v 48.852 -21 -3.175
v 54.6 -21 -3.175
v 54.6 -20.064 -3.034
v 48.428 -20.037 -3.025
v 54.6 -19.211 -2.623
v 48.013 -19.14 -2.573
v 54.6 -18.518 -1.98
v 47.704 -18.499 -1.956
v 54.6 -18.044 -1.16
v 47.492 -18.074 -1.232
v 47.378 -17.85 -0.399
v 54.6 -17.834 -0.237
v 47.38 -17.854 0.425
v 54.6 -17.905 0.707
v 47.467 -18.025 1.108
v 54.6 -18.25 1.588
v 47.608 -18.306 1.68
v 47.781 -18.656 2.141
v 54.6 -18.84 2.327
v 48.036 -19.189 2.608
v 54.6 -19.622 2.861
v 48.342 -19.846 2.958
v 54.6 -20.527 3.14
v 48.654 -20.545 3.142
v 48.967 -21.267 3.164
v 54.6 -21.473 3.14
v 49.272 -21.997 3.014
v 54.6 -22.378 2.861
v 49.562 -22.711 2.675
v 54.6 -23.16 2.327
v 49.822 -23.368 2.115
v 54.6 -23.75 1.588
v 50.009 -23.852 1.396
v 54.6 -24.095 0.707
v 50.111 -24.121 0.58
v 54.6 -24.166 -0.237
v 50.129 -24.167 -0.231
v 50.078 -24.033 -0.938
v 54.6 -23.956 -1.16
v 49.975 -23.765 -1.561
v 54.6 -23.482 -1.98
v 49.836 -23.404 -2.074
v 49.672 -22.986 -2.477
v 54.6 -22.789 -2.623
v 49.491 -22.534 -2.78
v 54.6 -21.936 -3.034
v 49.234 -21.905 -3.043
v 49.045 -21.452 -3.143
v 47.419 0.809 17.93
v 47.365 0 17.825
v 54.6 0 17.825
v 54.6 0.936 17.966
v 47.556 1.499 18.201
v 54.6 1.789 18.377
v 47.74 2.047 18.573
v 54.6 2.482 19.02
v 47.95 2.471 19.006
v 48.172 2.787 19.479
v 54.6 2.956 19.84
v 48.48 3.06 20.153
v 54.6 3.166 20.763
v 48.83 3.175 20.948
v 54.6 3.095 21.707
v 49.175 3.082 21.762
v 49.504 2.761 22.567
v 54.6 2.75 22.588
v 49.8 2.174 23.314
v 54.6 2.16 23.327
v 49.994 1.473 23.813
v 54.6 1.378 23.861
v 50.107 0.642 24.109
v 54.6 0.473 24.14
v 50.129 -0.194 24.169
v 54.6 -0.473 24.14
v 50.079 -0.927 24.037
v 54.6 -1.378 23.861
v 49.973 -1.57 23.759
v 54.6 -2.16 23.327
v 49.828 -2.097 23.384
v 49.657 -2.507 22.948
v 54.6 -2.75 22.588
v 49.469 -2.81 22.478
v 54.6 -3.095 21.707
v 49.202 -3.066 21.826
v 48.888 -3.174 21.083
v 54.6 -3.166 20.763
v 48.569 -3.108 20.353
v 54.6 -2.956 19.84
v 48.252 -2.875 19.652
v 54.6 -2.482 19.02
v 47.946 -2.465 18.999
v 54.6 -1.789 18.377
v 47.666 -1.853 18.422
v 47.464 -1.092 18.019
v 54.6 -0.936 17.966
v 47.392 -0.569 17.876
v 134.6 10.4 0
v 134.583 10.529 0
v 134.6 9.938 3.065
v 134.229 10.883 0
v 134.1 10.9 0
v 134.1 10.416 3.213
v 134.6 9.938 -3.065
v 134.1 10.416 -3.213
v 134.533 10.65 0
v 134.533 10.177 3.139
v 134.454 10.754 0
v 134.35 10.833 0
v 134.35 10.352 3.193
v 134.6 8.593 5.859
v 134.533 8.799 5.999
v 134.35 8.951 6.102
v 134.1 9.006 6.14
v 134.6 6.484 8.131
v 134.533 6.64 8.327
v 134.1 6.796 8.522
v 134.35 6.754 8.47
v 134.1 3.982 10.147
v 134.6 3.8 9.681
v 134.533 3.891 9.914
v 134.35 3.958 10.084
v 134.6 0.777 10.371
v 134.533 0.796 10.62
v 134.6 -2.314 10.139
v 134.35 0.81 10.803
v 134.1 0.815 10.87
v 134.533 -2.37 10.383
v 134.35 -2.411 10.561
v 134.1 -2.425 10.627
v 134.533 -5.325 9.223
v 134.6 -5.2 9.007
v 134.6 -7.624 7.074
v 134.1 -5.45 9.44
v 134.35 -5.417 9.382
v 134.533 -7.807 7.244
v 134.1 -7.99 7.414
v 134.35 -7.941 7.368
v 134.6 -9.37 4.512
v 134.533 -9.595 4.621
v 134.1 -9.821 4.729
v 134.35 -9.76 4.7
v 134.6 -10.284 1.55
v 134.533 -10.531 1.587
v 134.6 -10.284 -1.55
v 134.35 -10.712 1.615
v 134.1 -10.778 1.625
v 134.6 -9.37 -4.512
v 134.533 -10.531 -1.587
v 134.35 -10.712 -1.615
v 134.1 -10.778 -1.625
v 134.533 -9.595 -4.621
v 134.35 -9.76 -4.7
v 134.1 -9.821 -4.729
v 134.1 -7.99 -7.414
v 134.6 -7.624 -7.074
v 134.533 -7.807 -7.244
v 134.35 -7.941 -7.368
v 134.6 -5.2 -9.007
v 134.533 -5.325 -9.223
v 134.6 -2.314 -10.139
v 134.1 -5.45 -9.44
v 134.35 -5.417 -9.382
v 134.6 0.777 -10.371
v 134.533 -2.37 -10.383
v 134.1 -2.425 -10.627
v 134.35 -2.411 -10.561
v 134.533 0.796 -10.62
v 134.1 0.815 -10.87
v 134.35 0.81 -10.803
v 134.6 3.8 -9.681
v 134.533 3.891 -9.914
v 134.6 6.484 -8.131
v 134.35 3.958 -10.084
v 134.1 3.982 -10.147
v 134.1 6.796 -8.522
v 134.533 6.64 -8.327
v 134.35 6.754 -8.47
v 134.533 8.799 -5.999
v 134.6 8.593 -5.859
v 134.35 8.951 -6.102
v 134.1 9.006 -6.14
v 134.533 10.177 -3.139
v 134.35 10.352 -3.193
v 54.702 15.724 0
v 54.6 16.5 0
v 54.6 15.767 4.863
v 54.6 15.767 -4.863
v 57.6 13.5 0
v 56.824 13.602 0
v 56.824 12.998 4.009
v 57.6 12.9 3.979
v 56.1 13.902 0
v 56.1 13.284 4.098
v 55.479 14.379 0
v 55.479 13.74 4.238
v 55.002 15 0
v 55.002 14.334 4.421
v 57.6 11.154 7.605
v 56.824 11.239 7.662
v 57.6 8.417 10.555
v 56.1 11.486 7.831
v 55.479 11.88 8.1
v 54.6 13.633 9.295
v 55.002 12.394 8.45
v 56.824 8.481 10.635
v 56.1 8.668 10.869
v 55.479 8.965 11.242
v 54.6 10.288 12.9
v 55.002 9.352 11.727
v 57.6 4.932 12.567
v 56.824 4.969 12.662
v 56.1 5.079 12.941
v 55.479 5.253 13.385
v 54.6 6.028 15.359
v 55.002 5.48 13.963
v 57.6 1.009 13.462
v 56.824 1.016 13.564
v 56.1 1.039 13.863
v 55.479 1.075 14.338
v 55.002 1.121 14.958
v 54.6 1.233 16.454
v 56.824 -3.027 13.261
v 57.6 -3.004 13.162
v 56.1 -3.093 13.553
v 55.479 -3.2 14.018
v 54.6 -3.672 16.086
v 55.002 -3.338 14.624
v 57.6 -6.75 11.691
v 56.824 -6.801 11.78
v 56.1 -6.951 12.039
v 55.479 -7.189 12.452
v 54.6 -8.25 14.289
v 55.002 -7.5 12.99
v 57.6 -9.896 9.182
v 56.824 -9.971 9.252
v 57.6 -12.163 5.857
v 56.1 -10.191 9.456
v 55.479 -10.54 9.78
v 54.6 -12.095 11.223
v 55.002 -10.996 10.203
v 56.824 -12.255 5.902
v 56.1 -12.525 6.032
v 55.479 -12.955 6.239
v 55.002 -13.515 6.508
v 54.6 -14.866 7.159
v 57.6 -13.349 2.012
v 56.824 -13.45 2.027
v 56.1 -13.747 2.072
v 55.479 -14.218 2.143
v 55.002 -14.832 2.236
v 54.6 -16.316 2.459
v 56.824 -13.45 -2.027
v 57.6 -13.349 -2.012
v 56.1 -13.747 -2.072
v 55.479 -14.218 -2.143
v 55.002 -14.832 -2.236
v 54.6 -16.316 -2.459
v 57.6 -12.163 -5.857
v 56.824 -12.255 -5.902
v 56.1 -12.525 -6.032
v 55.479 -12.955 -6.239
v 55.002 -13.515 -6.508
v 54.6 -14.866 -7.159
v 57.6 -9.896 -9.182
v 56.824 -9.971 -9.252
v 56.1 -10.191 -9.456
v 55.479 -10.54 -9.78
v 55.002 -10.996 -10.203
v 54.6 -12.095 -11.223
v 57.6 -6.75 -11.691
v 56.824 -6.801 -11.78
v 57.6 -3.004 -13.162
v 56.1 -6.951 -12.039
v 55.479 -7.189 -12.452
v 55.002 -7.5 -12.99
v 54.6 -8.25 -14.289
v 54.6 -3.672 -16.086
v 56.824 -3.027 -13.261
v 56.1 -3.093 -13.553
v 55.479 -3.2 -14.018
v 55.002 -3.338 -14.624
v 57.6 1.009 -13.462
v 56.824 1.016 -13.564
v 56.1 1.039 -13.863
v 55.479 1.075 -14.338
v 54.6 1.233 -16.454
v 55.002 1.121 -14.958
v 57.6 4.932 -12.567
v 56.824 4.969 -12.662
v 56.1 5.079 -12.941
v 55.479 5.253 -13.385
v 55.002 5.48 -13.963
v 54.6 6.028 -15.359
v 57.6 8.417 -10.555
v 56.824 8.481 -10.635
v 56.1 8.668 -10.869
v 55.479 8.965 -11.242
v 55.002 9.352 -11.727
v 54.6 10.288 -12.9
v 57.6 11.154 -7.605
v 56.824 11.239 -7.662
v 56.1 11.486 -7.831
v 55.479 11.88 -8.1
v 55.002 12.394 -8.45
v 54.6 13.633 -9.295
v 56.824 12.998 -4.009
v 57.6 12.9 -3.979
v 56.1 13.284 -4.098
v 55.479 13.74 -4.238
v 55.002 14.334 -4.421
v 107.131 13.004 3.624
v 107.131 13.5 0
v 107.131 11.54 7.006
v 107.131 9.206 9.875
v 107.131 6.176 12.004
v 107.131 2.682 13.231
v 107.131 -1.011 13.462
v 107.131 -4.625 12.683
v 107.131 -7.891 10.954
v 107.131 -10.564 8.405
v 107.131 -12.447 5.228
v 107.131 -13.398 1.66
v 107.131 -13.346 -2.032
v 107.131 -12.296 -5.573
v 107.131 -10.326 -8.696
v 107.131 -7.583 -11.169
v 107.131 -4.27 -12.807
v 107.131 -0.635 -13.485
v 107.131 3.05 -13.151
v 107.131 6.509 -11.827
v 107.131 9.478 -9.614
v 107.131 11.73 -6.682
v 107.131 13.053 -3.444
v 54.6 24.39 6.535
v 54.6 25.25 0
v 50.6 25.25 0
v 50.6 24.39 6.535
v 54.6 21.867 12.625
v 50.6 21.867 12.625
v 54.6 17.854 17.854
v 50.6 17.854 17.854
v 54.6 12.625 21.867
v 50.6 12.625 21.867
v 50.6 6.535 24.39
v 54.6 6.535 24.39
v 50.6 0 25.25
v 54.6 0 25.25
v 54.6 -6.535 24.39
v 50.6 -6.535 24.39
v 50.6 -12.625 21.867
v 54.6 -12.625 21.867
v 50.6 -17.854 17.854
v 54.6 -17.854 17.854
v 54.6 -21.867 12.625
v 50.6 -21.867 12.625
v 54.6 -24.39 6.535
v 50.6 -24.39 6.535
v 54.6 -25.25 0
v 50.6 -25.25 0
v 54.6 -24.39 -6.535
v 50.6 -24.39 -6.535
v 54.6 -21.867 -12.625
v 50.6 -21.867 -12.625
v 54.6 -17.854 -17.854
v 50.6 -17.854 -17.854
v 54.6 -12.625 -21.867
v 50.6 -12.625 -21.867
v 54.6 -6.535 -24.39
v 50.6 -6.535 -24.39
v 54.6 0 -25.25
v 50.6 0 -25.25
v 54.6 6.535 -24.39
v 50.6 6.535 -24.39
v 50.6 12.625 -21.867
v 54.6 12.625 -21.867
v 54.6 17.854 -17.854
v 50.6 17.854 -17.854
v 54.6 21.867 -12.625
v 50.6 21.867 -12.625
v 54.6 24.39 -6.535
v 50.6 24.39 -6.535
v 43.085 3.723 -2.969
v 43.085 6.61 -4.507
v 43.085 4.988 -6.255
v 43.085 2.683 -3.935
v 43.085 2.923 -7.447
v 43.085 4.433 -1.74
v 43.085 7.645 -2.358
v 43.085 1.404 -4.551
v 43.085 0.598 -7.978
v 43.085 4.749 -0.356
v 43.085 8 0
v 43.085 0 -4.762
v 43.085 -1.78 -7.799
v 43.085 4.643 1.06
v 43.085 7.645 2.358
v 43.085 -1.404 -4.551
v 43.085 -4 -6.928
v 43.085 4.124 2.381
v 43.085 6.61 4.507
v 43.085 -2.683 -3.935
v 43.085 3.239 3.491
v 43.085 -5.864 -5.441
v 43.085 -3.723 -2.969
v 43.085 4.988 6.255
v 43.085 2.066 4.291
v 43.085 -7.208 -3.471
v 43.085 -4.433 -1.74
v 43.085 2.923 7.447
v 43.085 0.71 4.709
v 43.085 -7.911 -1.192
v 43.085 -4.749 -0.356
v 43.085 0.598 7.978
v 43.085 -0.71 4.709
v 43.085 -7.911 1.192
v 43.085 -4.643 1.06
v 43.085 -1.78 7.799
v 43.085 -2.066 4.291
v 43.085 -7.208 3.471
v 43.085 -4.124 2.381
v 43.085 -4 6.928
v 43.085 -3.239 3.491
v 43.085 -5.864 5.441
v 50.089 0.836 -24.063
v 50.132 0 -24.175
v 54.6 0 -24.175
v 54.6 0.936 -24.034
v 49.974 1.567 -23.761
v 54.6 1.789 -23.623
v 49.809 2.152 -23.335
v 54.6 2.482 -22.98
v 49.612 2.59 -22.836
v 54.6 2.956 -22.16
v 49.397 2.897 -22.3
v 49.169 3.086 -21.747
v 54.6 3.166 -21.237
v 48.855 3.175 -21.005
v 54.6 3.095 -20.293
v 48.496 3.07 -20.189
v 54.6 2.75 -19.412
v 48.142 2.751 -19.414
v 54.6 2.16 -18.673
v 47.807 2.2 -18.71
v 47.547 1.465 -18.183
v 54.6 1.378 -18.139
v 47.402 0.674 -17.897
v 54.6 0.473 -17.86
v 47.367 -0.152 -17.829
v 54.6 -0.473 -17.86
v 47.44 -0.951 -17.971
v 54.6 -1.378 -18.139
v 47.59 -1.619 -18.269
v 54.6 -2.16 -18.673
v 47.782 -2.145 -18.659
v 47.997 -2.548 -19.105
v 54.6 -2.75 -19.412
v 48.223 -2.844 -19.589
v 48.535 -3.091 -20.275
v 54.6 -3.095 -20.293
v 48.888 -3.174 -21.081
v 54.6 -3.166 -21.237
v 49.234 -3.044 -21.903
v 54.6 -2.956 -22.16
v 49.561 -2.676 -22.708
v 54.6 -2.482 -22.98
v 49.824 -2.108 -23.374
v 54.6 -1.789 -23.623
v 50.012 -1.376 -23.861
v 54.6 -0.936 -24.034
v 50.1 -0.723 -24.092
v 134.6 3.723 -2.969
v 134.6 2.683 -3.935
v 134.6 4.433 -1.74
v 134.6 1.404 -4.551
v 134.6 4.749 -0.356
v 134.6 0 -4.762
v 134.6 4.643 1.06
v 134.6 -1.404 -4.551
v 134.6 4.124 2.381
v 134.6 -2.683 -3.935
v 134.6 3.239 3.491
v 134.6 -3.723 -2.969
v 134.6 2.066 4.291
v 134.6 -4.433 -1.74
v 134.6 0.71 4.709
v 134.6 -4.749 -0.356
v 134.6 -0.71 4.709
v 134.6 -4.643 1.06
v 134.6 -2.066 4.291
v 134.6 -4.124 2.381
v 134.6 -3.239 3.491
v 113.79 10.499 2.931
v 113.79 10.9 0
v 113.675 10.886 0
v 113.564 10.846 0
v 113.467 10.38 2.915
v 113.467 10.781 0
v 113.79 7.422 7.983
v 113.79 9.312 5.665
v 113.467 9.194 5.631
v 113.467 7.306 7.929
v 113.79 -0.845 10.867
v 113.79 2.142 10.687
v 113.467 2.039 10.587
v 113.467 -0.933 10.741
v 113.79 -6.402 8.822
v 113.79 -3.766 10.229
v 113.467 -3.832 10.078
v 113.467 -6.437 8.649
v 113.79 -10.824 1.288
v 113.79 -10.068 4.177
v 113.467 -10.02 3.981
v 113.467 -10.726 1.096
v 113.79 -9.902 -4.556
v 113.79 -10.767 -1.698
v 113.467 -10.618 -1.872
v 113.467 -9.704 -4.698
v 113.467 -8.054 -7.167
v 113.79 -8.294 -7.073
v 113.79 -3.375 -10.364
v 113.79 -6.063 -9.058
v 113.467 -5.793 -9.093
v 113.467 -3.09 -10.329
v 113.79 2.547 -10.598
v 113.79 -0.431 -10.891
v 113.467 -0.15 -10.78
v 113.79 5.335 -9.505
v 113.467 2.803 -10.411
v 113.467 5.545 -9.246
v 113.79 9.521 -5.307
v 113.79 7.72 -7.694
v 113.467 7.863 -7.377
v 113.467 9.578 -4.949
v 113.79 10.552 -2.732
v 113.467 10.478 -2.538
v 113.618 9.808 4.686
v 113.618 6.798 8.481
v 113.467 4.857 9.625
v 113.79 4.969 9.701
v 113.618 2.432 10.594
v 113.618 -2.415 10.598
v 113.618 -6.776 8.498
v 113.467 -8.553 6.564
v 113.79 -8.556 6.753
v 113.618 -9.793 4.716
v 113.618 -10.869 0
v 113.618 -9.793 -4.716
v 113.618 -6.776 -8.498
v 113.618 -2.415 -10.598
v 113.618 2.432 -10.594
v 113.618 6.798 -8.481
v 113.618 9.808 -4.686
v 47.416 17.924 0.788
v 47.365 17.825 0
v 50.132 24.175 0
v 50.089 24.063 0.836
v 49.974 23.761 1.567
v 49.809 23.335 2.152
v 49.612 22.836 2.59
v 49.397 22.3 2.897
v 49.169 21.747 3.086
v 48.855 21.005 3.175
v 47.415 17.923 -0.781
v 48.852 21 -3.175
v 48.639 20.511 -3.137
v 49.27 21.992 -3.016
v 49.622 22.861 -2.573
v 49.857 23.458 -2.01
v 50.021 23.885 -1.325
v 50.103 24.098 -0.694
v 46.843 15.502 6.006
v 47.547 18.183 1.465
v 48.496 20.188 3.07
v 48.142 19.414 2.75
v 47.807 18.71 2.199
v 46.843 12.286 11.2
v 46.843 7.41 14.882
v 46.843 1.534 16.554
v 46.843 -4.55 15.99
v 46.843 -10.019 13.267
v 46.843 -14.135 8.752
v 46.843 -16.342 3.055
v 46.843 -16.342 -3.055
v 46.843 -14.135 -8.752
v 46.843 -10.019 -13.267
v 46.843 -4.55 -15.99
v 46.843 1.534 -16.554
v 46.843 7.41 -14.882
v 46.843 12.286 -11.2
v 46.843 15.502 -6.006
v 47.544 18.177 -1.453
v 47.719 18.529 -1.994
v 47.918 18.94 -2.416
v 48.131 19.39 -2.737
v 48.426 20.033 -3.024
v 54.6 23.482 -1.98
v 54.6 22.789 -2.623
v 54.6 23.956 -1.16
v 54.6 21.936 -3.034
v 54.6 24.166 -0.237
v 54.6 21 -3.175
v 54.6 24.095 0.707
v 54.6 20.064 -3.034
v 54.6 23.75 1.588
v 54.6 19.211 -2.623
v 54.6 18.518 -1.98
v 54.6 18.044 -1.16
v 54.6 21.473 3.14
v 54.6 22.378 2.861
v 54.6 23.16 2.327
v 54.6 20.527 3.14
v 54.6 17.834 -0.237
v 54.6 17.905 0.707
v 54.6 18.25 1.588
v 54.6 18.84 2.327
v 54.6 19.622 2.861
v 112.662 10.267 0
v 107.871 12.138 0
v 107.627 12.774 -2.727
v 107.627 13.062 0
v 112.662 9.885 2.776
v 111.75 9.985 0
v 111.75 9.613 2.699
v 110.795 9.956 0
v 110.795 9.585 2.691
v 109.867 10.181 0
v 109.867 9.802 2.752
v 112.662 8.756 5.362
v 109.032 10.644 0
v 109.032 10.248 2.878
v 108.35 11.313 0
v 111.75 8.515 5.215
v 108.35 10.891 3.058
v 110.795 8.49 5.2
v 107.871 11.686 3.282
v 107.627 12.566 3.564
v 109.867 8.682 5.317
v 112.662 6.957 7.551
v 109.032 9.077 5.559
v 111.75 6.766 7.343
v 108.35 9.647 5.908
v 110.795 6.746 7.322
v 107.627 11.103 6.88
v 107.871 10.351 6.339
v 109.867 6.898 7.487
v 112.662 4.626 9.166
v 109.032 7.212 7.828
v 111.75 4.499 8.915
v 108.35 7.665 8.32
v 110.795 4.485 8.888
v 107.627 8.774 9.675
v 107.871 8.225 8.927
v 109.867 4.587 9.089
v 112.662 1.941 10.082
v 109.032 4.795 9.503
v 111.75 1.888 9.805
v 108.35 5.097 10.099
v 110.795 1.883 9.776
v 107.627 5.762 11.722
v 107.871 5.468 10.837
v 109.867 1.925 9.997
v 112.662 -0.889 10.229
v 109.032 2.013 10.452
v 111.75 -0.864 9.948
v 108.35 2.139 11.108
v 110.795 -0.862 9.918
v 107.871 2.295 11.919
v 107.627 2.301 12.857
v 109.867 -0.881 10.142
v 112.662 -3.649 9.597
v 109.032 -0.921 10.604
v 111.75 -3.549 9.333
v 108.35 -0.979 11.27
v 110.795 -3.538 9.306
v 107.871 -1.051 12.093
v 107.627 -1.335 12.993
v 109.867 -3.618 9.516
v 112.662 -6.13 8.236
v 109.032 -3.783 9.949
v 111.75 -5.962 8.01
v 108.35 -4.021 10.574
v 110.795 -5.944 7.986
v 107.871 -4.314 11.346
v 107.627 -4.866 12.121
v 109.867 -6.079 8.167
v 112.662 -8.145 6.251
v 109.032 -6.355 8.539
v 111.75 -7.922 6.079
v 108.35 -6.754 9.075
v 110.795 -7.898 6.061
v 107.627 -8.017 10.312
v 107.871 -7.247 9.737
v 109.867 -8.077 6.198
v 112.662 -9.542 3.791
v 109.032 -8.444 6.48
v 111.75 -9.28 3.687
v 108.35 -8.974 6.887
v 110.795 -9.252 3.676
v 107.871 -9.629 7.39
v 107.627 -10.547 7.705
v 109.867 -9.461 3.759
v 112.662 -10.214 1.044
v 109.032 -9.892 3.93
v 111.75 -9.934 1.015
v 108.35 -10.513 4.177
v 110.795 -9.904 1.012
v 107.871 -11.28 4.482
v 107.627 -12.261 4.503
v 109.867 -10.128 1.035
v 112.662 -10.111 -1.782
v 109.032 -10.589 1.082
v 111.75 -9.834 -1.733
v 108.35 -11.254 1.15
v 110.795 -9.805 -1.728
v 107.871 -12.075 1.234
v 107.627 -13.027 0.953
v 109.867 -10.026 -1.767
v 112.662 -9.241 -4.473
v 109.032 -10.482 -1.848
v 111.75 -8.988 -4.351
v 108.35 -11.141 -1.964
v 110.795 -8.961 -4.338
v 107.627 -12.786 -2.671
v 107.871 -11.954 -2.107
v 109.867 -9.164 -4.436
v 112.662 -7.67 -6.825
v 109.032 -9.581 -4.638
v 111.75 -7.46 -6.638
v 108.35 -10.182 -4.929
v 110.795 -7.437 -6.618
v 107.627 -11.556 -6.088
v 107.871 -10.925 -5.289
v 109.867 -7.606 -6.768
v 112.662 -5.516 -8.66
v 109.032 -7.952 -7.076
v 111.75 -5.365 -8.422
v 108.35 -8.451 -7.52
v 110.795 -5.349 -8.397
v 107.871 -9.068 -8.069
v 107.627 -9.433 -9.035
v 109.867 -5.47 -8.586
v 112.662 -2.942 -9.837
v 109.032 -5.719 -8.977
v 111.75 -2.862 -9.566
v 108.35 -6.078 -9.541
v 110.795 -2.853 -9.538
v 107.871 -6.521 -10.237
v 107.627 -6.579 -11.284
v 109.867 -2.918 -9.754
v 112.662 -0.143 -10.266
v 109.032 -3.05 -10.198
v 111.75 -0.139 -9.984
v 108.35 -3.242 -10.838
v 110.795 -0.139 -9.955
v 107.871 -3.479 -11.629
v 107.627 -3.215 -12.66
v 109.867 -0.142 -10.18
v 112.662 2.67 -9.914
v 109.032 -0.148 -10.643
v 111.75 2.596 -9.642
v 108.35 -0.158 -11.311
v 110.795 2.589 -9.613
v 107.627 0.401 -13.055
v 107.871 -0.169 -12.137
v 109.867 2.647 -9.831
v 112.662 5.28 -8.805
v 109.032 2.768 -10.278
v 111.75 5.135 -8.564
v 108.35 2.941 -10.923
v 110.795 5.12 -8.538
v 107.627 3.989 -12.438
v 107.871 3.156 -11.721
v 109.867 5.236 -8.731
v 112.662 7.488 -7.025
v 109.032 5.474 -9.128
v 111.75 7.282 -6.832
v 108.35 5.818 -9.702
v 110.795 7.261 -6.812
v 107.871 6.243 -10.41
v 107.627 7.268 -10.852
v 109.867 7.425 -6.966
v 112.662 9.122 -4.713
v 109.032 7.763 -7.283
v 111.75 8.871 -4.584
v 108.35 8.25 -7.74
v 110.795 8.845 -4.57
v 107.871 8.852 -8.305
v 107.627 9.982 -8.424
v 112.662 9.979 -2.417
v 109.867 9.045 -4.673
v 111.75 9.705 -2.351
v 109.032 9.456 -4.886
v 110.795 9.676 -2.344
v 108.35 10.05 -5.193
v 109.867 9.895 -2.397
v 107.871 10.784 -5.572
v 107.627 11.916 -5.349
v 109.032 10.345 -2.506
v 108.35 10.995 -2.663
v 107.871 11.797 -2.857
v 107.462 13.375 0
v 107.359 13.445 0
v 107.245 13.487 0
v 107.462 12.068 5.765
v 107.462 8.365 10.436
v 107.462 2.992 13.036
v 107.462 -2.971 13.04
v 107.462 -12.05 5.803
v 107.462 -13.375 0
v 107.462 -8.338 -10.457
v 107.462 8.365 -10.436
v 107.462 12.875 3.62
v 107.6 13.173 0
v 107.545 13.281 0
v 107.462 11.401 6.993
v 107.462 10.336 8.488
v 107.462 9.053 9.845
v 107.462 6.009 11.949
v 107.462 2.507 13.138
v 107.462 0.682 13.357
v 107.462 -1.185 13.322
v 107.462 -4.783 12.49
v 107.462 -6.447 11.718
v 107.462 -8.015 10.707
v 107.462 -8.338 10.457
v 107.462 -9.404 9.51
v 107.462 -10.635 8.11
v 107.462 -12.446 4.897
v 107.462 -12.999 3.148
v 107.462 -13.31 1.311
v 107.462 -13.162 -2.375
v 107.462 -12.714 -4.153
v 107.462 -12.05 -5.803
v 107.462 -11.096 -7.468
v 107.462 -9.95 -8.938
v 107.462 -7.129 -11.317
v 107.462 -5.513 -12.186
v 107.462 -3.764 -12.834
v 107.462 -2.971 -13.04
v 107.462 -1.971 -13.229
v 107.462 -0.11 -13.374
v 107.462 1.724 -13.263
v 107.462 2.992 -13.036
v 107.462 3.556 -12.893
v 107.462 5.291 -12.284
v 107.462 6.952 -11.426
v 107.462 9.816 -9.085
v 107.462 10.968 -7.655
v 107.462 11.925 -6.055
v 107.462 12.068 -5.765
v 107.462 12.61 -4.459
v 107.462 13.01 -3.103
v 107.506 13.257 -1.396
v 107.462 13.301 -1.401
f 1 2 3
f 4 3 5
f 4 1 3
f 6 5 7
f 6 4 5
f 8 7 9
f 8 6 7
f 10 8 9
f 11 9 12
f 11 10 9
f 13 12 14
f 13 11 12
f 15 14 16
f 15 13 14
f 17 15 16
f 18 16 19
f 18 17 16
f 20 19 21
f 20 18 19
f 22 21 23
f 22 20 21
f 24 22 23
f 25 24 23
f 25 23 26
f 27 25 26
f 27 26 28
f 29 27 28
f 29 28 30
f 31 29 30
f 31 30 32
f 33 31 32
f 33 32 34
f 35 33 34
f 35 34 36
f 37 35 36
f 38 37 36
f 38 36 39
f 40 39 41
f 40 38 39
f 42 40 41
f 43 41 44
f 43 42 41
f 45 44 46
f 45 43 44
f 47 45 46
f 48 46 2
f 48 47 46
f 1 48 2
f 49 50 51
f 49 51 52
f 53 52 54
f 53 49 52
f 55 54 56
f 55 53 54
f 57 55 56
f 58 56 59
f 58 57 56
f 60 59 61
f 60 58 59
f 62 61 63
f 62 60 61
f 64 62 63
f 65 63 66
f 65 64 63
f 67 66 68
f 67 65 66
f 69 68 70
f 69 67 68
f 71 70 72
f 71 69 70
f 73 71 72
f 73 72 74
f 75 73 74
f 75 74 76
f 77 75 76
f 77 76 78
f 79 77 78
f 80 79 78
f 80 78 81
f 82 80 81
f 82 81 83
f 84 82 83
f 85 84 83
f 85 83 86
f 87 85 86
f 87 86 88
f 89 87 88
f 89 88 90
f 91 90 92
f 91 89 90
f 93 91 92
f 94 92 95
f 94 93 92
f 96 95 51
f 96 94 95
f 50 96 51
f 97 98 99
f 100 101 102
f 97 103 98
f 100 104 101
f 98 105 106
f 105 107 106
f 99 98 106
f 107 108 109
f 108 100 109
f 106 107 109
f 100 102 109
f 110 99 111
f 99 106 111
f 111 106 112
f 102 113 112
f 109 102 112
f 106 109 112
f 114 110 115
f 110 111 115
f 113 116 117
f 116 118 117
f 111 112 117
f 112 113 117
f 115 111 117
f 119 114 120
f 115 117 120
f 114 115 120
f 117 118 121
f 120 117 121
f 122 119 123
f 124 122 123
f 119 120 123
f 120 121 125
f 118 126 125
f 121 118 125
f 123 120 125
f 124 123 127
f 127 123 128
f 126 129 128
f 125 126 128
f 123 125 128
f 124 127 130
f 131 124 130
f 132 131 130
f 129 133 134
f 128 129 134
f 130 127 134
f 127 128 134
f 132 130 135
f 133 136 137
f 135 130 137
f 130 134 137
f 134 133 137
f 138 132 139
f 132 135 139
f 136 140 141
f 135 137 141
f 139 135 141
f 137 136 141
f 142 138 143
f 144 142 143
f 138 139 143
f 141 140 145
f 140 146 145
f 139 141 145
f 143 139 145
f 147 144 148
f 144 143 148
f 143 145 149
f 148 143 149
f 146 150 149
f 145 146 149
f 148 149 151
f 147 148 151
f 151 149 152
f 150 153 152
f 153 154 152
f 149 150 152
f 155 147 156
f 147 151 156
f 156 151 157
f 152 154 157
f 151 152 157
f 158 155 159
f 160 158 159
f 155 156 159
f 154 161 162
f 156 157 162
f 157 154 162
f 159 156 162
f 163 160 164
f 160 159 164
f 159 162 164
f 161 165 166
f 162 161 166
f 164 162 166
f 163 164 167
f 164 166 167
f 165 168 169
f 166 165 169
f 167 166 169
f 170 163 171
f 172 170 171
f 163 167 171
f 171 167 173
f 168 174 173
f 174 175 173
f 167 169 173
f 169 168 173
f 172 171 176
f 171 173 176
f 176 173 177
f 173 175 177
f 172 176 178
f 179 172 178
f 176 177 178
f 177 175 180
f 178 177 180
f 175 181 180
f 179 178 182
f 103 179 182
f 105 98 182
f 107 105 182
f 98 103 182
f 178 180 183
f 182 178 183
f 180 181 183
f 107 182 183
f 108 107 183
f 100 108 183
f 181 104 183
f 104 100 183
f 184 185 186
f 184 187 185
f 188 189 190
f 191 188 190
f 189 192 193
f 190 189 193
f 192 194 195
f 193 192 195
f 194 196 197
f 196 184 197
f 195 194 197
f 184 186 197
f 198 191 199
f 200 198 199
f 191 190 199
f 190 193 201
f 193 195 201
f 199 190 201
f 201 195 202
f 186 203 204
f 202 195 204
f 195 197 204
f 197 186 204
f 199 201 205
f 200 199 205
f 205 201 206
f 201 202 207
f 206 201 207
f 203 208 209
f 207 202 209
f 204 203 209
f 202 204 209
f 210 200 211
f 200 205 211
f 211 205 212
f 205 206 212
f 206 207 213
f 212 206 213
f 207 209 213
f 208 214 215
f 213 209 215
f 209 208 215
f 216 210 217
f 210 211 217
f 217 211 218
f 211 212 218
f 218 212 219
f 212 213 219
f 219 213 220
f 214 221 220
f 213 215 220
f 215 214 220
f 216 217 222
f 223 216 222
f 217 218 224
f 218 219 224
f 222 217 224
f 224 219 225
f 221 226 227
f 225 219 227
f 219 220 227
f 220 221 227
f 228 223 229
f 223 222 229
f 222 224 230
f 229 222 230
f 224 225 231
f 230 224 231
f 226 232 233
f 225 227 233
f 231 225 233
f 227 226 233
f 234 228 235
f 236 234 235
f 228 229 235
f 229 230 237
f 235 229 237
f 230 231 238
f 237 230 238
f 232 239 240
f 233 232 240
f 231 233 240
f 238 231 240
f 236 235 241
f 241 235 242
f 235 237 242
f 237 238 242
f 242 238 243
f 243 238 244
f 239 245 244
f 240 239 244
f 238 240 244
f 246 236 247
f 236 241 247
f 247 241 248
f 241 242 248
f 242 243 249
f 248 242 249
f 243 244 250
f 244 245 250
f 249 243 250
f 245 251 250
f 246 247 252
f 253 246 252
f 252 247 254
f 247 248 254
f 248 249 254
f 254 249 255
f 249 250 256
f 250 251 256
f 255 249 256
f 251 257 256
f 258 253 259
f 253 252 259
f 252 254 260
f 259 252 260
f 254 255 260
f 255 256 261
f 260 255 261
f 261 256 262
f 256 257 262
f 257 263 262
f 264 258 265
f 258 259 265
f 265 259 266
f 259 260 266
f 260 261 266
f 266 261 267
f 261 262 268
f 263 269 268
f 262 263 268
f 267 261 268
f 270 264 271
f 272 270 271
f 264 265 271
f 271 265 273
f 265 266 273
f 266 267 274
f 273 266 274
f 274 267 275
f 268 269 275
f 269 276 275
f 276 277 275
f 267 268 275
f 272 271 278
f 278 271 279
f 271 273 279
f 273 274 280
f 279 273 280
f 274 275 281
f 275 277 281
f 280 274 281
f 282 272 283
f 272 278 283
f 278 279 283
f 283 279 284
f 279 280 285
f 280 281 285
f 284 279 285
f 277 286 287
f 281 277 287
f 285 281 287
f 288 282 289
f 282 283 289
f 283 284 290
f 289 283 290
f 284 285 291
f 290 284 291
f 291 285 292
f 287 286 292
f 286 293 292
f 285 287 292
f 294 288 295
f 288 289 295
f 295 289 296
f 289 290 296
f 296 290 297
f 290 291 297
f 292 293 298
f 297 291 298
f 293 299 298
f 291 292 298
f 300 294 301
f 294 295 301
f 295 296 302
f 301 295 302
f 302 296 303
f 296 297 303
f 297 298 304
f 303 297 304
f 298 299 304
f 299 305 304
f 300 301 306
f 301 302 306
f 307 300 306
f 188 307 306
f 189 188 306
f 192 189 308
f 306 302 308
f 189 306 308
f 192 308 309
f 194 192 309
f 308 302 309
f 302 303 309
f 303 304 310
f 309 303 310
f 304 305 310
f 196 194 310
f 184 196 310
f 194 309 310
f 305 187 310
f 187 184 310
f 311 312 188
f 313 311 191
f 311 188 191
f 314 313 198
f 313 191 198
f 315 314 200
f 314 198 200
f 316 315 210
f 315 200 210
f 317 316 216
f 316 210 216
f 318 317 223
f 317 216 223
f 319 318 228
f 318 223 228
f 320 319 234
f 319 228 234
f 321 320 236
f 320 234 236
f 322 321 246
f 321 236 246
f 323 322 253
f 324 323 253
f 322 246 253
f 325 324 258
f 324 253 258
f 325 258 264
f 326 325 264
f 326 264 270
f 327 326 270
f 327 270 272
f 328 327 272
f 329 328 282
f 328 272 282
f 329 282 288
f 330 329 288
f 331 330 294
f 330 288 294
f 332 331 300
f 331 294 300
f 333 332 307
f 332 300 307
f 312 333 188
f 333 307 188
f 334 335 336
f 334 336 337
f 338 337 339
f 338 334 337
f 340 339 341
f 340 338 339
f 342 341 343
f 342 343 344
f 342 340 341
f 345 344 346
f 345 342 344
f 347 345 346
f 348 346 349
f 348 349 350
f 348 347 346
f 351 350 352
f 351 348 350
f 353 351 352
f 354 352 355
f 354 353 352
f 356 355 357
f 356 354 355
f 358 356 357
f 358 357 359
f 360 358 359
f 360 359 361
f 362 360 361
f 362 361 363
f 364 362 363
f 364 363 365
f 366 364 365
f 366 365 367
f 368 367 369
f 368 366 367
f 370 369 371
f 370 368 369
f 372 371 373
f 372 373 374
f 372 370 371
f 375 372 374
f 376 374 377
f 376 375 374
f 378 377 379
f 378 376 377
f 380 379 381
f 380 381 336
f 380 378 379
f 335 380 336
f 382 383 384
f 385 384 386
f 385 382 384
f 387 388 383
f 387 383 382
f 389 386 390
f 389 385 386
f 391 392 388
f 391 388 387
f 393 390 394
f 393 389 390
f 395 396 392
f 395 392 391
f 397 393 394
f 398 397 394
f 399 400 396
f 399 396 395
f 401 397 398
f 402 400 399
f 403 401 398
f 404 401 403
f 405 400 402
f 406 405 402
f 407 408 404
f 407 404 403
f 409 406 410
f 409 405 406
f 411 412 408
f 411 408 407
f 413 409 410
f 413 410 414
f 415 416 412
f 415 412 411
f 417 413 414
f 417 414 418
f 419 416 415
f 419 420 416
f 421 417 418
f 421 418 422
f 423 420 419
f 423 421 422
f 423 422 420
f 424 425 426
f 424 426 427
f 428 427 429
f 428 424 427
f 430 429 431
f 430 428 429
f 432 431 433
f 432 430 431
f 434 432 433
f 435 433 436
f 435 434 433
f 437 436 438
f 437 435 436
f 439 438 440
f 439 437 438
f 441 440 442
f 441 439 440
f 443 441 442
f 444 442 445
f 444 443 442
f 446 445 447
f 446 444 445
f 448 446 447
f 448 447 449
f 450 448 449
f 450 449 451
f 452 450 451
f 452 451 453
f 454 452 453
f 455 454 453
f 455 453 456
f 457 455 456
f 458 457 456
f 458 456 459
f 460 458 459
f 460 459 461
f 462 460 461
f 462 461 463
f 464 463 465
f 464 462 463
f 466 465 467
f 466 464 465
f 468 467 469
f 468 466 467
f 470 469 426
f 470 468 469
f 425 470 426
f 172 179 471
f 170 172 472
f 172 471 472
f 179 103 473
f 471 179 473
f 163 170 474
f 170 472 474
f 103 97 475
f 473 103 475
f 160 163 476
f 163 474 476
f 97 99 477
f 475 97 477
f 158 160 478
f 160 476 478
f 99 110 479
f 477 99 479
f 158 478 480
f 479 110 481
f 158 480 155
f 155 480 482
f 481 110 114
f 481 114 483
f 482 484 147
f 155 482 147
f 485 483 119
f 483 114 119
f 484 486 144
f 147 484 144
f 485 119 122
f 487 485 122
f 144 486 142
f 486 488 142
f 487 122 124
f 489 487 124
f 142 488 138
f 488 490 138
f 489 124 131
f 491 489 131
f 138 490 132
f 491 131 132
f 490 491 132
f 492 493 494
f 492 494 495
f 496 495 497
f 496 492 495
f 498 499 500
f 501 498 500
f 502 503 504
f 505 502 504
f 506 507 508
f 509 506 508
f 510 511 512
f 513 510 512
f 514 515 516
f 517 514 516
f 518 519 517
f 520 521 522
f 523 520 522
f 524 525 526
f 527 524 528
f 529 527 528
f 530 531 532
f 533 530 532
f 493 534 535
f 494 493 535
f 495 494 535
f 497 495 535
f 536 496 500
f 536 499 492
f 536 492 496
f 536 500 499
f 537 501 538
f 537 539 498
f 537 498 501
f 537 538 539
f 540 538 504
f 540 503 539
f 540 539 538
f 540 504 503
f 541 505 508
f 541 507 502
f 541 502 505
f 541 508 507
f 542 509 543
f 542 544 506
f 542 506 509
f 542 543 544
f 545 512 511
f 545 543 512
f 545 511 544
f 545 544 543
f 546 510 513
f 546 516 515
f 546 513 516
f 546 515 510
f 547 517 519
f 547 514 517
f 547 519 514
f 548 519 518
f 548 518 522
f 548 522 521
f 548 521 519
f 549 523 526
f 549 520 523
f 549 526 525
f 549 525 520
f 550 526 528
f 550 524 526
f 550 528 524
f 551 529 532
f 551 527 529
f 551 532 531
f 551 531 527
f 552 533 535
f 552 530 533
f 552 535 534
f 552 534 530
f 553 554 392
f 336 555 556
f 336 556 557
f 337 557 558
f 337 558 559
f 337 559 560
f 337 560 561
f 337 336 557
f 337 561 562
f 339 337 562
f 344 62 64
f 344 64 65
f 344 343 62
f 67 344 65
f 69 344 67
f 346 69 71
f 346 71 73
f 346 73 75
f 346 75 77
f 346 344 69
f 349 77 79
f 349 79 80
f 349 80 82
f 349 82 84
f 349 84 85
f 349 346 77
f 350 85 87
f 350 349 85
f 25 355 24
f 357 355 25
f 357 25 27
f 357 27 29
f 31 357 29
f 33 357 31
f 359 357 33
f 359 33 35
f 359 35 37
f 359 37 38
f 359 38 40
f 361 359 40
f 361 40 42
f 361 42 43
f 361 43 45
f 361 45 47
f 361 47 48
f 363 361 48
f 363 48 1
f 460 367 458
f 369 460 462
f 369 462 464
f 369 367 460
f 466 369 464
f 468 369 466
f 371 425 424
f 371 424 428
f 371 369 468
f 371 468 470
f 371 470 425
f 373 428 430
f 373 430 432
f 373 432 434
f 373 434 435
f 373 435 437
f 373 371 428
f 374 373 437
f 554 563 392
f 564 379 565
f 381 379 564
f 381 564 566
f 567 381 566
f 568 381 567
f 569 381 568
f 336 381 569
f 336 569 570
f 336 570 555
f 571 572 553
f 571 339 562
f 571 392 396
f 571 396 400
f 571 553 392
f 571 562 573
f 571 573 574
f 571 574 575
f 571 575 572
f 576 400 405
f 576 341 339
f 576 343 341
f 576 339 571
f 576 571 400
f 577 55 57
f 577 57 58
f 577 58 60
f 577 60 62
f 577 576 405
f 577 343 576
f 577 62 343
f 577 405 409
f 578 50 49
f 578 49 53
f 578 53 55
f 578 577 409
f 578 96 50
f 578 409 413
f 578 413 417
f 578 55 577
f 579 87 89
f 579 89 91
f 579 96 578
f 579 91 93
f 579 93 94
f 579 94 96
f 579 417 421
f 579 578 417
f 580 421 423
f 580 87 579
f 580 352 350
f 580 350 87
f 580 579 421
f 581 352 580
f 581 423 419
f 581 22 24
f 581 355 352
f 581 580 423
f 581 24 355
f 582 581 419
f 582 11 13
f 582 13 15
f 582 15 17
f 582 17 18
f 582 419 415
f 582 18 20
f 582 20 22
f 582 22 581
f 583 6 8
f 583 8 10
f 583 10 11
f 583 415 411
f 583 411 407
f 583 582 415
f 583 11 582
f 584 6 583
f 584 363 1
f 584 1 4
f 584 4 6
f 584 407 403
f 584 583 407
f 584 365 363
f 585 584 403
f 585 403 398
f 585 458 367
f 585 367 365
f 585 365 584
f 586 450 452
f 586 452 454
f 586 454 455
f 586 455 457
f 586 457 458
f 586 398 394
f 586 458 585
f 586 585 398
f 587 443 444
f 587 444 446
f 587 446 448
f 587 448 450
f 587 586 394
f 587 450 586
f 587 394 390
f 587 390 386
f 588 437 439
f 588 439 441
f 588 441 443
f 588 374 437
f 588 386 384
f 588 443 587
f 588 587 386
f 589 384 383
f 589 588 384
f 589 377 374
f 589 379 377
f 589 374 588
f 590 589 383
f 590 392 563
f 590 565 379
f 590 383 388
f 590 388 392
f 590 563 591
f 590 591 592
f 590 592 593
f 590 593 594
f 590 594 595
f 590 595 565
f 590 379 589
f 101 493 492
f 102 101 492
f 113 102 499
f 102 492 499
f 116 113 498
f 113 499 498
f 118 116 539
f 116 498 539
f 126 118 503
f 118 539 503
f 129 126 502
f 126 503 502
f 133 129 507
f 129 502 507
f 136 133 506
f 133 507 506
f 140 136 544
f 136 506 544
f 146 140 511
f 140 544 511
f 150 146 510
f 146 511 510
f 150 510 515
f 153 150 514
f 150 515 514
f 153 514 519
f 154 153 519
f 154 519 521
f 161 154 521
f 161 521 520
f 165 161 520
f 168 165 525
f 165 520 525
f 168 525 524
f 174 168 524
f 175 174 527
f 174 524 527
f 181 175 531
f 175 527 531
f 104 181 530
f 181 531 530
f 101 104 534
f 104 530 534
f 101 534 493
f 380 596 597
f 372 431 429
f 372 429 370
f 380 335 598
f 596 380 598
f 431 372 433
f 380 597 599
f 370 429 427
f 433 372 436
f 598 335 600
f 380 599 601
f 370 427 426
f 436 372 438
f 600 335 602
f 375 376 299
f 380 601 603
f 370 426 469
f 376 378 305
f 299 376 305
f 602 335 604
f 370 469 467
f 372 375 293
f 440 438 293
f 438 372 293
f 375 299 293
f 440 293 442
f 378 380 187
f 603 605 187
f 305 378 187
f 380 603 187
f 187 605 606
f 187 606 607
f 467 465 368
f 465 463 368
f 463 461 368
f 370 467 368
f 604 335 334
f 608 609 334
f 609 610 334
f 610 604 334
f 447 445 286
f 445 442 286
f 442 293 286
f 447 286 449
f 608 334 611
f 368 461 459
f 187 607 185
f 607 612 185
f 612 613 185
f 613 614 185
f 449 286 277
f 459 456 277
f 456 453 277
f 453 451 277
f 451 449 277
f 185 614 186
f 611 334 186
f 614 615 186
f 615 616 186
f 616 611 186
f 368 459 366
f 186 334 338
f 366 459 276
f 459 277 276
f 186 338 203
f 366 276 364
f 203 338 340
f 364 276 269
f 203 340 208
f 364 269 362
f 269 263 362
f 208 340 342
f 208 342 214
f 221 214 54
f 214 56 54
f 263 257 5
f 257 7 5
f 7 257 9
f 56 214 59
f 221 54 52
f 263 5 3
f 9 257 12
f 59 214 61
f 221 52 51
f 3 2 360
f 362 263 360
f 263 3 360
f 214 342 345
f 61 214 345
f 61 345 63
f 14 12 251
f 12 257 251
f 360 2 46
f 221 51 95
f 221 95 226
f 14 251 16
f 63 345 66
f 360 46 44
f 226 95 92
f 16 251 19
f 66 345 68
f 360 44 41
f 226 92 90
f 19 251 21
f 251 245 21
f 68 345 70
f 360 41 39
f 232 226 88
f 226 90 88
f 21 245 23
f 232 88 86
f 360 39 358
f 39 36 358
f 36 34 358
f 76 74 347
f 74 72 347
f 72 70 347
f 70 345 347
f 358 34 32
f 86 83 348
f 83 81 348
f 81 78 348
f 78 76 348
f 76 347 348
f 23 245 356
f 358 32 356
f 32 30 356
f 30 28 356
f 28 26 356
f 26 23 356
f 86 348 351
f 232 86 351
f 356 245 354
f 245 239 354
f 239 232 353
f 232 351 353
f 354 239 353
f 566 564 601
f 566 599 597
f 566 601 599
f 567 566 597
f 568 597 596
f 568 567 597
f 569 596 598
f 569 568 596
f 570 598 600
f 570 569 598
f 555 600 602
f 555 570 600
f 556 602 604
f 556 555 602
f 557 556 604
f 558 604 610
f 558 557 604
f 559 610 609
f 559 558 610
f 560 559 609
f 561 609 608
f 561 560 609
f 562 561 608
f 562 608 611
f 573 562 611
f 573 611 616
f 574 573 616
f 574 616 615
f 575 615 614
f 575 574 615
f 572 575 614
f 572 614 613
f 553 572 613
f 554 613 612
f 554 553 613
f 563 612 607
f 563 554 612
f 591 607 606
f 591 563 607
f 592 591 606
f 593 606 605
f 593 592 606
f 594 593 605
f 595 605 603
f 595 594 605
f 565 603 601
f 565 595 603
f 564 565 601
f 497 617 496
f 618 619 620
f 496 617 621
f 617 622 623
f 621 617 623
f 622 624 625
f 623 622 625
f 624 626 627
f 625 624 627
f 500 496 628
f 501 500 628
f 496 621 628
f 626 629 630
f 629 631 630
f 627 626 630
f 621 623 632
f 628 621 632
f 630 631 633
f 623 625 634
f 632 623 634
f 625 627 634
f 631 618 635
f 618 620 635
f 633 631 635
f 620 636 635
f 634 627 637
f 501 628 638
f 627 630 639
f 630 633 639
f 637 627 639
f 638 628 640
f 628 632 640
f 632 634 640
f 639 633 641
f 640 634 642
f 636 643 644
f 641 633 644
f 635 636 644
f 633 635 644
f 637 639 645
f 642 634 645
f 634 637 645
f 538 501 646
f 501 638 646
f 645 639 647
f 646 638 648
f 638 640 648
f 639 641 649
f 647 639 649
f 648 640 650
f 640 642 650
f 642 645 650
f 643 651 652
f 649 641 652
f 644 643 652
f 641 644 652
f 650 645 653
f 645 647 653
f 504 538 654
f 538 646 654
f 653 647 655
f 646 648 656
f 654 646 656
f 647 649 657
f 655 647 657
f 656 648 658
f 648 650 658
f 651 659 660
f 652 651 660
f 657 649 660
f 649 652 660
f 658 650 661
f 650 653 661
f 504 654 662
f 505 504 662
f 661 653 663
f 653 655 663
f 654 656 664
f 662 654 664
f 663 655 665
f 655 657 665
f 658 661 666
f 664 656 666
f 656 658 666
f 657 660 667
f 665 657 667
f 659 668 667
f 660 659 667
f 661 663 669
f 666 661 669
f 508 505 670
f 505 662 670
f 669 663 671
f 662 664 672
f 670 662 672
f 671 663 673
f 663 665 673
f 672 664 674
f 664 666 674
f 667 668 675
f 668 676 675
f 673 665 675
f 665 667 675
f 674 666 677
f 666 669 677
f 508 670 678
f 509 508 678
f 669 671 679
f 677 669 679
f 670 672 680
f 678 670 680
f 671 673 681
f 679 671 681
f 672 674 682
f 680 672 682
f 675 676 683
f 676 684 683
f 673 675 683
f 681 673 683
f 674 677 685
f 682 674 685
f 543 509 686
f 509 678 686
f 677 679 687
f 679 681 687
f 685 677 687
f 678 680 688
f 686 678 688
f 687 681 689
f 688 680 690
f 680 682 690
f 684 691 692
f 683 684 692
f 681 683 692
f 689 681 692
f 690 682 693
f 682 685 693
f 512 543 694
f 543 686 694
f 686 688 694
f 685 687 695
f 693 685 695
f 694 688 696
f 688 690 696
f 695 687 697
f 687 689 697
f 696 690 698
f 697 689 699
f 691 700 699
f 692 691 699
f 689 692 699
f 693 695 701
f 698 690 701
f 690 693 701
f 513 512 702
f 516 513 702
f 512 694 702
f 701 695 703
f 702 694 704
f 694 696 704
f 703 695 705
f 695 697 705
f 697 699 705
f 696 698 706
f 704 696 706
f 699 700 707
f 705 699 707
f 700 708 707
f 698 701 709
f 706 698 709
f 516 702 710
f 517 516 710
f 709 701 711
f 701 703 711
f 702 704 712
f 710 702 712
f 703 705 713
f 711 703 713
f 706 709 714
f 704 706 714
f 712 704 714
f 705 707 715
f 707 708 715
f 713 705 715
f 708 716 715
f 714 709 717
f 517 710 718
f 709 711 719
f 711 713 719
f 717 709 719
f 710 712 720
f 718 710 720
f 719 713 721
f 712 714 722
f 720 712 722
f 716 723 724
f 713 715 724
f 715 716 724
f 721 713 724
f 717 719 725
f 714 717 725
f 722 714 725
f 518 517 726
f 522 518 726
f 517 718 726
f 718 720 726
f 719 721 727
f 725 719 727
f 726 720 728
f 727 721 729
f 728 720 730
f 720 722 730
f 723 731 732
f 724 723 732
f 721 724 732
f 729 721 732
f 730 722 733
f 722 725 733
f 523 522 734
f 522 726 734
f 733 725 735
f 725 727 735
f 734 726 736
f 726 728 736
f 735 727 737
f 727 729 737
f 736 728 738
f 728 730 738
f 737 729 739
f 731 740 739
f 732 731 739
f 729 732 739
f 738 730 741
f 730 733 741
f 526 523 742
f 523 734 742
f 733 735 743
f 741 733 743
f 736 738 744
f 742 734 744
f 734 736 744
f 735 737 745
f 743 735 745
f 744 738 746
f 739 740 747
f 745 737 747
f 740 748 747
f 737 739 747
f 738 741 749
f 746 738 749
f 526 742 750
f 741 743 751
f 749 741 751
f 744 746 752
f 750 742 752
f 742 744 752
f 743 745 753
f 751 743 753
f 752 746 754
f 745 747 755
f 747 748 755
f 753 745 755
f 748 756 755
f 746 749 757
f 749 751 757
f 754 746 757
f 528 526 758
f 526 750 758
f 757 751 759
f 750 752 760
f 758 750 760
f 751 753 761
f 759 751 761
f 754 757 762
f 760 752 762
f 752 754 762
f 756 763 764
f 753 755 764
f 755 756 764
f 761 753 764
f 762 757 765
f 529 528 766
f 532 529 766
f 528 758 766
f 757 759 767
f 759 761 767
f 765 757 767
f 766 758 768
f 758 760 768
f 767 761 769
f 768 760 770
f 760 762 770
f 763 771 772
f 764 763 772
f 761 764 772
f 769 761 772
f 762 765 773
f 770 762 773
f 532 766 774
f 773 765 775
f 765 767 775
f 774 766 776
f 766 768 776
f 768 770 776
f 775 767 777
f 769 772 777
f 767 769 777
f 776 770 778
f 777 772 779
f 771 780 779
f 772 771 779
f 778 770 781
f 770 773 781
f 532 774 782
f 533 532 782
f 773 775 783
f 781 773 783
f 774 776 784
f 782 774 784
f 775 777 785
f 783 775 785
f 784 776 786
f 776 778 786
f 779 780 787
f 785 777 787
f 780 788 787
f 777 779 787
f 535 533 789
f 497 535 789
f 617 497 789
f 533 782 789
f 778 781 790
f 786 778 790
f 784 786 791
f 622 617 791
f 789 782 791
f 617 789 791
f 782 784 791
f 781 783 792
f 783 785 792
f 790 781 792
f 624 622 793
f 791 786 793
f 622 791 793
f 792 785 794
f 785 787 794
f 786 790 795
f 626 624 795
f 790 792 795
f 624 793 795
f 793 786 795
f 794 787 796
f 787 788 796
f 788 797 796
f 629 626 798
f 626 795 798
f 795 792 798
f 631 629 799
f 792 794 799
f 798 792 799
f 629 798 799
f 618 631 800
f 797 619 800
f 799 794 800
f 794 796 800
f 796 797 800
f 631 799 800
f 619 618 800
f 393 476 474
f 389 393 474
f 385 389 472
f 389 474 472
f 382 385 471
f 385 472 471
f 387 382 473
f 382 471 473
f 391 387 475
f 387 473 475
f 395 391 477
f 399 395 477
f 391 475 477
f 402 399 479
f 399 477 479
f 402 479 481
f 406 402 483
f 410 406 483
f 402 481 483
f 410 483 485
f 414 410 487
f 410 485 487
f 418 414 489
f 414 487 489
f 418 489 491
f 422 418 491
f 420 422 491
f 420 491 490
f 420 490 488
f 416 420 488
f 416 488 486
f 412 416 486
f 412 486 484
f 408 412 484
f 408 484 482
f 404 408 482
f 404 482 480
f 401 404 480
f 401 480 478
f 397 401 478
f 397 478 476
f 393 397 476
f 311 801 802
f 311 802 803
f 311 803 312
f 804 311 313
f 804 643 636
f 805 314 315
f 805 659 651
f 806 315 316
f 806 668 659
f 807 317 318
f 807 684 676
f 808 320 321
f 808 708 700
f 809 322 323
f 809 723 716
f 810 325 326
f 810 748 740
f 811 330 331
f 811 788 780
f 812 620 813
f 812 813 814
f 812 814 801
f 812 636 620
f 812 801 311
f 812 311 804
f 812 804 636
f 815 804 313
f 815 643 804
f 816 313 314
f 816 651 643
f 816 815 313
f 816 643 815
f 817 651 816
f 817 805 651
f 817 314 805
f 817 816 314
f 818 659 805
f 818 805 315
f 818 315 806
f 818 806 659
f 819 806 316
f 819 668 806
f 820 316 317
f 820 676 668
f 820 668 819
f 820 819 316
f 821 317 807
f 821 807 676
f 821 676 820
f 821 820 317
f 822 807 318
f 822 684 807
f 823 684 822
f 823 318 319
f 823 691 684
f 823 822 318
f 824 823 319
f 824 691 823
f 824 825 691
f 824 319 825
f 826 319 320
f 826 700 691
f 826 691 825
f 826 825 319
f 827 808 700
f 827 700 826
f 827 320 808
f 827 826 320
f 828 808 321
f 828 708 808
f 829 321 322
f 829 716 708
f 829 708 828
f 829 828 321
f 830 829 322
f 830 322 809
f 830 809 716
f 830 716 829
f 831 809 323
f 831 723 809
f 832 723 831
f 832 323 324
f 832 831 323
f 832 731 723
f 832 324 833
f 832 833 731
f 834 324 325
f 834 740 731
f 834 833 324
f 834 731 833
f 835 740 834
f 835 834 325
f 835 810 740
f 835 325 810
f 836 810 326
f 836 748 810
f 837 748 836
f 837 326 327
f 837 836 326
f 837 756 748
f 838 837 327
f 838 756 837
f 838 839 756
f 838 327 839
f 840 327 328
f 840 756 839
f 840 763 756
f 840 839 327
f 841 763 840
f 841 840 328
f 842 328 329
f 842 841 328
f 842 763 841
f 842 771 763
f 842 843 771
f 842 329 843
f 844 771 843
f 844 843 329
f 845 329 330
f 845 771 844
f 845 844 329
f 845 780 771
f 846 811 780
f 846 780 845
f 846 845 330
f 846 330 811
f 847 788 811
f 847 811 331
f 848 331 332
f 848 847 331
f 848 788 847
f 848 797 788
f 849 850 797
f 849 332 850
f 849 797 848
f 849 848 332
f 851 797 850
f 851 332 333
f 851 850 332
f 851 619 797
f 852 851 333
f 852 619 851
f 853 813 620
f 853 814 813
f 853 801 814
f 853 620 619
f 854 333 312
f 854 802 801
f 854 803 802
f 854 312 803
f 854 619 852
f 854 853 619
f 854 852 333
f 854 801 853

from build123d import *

# Parameters (mm, degrees)
FILLET1_R          = 0.5
FILLET2_R          = 3
SKETCH3_R          = 4.7625
CUT_EXTRUDE1_DEPTH = 92.514851485
SKETCH4_R          = 3.175
CUT_EXTRUDE3_DEPTH = 135.6


with BuildPart() as part:
    # Sketch1 → Revolve1 (revolve)
    with BuildSketch(Plane.XY):
        with BuildLine():
            Line((134.6, 0), (134.6, 10.9))
            Line((134.6, 10.9), (113.6, 10.9))
            ThreePointArc((113.6, 10.9), (109.746525497, 10.230443455), (107.6, 13.5))
            Line((107.6, 13.5), (54.6, 13.5))
            Line((54.6, 13.5), (54.6, 27.5))
            Line((54.6, 27.5), (47.6, 27.5))
            Line((47.6, 27.5), (47.6, 32.25))
            Line((47.6, 32.25), (44.6, 32.25))
            Line((44.6, 32.25), (44.6, 37))
            Line((44.6, 37), (40.6, 37))
            Line((40.6, 37), (40.6, 42))
            Line((40.6, 42), (23, 42))
            Line((23, 42), (23, 43))
            Line((23, 43), (5, 43))
            Line((5, 43), (5, 44))
            Line((5, 44), (0, 44))
            Line((0, 44), (0, 0))
            Line((0, 0), (134.6, 0))
        make_face()
    revolve(axis=Axis((-159.727345132, 0, 0), (1, 0, 0)))

    # Fillet1
    fillet1_edges = [part.edges().sort_by_distance(p)[0] for p in [
        (5, -43, 0),
        (23, -42, 0),
        (40.6, -42, 0),
        (40.6, -37, 0),
        (44.6, -37, 0),
        (44.6, -32.25, 0),
        (47.6, -32.25, 0),
        (47.6, -27.5, 0),
        (54.6, -27.5, 0),
        (107.6, -13.5, 0),
        (113.6, -10.9, 0),
        (134.6, -10.9, 0),
    ]]
    fillet(fillet1_edges, radius=FILLET1_R)

    # Fillet2
    fillet2_edges = [part.edges().sort_by_distance(p)[0] for p in [
        (54.6, -13.5, 0),
    ]]
    fillet(fillet2_edges, radius=FILLET2_R)

    # Sketch2 → Cut-Revolve1 (revolve, cut)
    with BuildSketch(Plane.XY):
        Polygon((50.6, 25.25), (64.002595821, 25.25), (64.002595821, 54.446385227), (-9.354779202, 54.446385227), (-9.354779202, 0), (39.6, 0), (43.085148515, 0), (43.085148515, 8), align=None)
    revolve(axis=Axis((-12.93677823, 0, 0), (1, 0, 0)), mode=Mode.SUBTRACT)

    # Sketch3 → Cut-Extrude1 (cut, through all)
    with BuildSketch(Plane(origin=(134.6, 0, 0), x_dir=(0, 0, -1), z_dir=(1, 0, 0))):
        Circle(SKETCH3_R)
    extrude(amount=-CUT_EXTRUDE1_DEPTH, mode=Mode.SUBTRACT)

    # Sketch4 → Cut-Extrude3 (cut, through all)
    with BuildSketch(Plane(origin=(0, 0, 0), x_dir=(0, 0, -1), z_dir=(1, 0, 0))):
        with Locations((21, 0)):
            Circle(SKETCH4_R)
        with Locations((0, -21)):
            Circle(SKETCH4_R)
        with Locations((0, 21)):
            Circle(SKETCH4_R)
        with Locations((-21, 0)):
            Circle(SKETCH4_R)
    extrude(amount=CUT_EXTRUDE3_DEPTH, mode=Mode.SUBTRACT)


solid = part.part
